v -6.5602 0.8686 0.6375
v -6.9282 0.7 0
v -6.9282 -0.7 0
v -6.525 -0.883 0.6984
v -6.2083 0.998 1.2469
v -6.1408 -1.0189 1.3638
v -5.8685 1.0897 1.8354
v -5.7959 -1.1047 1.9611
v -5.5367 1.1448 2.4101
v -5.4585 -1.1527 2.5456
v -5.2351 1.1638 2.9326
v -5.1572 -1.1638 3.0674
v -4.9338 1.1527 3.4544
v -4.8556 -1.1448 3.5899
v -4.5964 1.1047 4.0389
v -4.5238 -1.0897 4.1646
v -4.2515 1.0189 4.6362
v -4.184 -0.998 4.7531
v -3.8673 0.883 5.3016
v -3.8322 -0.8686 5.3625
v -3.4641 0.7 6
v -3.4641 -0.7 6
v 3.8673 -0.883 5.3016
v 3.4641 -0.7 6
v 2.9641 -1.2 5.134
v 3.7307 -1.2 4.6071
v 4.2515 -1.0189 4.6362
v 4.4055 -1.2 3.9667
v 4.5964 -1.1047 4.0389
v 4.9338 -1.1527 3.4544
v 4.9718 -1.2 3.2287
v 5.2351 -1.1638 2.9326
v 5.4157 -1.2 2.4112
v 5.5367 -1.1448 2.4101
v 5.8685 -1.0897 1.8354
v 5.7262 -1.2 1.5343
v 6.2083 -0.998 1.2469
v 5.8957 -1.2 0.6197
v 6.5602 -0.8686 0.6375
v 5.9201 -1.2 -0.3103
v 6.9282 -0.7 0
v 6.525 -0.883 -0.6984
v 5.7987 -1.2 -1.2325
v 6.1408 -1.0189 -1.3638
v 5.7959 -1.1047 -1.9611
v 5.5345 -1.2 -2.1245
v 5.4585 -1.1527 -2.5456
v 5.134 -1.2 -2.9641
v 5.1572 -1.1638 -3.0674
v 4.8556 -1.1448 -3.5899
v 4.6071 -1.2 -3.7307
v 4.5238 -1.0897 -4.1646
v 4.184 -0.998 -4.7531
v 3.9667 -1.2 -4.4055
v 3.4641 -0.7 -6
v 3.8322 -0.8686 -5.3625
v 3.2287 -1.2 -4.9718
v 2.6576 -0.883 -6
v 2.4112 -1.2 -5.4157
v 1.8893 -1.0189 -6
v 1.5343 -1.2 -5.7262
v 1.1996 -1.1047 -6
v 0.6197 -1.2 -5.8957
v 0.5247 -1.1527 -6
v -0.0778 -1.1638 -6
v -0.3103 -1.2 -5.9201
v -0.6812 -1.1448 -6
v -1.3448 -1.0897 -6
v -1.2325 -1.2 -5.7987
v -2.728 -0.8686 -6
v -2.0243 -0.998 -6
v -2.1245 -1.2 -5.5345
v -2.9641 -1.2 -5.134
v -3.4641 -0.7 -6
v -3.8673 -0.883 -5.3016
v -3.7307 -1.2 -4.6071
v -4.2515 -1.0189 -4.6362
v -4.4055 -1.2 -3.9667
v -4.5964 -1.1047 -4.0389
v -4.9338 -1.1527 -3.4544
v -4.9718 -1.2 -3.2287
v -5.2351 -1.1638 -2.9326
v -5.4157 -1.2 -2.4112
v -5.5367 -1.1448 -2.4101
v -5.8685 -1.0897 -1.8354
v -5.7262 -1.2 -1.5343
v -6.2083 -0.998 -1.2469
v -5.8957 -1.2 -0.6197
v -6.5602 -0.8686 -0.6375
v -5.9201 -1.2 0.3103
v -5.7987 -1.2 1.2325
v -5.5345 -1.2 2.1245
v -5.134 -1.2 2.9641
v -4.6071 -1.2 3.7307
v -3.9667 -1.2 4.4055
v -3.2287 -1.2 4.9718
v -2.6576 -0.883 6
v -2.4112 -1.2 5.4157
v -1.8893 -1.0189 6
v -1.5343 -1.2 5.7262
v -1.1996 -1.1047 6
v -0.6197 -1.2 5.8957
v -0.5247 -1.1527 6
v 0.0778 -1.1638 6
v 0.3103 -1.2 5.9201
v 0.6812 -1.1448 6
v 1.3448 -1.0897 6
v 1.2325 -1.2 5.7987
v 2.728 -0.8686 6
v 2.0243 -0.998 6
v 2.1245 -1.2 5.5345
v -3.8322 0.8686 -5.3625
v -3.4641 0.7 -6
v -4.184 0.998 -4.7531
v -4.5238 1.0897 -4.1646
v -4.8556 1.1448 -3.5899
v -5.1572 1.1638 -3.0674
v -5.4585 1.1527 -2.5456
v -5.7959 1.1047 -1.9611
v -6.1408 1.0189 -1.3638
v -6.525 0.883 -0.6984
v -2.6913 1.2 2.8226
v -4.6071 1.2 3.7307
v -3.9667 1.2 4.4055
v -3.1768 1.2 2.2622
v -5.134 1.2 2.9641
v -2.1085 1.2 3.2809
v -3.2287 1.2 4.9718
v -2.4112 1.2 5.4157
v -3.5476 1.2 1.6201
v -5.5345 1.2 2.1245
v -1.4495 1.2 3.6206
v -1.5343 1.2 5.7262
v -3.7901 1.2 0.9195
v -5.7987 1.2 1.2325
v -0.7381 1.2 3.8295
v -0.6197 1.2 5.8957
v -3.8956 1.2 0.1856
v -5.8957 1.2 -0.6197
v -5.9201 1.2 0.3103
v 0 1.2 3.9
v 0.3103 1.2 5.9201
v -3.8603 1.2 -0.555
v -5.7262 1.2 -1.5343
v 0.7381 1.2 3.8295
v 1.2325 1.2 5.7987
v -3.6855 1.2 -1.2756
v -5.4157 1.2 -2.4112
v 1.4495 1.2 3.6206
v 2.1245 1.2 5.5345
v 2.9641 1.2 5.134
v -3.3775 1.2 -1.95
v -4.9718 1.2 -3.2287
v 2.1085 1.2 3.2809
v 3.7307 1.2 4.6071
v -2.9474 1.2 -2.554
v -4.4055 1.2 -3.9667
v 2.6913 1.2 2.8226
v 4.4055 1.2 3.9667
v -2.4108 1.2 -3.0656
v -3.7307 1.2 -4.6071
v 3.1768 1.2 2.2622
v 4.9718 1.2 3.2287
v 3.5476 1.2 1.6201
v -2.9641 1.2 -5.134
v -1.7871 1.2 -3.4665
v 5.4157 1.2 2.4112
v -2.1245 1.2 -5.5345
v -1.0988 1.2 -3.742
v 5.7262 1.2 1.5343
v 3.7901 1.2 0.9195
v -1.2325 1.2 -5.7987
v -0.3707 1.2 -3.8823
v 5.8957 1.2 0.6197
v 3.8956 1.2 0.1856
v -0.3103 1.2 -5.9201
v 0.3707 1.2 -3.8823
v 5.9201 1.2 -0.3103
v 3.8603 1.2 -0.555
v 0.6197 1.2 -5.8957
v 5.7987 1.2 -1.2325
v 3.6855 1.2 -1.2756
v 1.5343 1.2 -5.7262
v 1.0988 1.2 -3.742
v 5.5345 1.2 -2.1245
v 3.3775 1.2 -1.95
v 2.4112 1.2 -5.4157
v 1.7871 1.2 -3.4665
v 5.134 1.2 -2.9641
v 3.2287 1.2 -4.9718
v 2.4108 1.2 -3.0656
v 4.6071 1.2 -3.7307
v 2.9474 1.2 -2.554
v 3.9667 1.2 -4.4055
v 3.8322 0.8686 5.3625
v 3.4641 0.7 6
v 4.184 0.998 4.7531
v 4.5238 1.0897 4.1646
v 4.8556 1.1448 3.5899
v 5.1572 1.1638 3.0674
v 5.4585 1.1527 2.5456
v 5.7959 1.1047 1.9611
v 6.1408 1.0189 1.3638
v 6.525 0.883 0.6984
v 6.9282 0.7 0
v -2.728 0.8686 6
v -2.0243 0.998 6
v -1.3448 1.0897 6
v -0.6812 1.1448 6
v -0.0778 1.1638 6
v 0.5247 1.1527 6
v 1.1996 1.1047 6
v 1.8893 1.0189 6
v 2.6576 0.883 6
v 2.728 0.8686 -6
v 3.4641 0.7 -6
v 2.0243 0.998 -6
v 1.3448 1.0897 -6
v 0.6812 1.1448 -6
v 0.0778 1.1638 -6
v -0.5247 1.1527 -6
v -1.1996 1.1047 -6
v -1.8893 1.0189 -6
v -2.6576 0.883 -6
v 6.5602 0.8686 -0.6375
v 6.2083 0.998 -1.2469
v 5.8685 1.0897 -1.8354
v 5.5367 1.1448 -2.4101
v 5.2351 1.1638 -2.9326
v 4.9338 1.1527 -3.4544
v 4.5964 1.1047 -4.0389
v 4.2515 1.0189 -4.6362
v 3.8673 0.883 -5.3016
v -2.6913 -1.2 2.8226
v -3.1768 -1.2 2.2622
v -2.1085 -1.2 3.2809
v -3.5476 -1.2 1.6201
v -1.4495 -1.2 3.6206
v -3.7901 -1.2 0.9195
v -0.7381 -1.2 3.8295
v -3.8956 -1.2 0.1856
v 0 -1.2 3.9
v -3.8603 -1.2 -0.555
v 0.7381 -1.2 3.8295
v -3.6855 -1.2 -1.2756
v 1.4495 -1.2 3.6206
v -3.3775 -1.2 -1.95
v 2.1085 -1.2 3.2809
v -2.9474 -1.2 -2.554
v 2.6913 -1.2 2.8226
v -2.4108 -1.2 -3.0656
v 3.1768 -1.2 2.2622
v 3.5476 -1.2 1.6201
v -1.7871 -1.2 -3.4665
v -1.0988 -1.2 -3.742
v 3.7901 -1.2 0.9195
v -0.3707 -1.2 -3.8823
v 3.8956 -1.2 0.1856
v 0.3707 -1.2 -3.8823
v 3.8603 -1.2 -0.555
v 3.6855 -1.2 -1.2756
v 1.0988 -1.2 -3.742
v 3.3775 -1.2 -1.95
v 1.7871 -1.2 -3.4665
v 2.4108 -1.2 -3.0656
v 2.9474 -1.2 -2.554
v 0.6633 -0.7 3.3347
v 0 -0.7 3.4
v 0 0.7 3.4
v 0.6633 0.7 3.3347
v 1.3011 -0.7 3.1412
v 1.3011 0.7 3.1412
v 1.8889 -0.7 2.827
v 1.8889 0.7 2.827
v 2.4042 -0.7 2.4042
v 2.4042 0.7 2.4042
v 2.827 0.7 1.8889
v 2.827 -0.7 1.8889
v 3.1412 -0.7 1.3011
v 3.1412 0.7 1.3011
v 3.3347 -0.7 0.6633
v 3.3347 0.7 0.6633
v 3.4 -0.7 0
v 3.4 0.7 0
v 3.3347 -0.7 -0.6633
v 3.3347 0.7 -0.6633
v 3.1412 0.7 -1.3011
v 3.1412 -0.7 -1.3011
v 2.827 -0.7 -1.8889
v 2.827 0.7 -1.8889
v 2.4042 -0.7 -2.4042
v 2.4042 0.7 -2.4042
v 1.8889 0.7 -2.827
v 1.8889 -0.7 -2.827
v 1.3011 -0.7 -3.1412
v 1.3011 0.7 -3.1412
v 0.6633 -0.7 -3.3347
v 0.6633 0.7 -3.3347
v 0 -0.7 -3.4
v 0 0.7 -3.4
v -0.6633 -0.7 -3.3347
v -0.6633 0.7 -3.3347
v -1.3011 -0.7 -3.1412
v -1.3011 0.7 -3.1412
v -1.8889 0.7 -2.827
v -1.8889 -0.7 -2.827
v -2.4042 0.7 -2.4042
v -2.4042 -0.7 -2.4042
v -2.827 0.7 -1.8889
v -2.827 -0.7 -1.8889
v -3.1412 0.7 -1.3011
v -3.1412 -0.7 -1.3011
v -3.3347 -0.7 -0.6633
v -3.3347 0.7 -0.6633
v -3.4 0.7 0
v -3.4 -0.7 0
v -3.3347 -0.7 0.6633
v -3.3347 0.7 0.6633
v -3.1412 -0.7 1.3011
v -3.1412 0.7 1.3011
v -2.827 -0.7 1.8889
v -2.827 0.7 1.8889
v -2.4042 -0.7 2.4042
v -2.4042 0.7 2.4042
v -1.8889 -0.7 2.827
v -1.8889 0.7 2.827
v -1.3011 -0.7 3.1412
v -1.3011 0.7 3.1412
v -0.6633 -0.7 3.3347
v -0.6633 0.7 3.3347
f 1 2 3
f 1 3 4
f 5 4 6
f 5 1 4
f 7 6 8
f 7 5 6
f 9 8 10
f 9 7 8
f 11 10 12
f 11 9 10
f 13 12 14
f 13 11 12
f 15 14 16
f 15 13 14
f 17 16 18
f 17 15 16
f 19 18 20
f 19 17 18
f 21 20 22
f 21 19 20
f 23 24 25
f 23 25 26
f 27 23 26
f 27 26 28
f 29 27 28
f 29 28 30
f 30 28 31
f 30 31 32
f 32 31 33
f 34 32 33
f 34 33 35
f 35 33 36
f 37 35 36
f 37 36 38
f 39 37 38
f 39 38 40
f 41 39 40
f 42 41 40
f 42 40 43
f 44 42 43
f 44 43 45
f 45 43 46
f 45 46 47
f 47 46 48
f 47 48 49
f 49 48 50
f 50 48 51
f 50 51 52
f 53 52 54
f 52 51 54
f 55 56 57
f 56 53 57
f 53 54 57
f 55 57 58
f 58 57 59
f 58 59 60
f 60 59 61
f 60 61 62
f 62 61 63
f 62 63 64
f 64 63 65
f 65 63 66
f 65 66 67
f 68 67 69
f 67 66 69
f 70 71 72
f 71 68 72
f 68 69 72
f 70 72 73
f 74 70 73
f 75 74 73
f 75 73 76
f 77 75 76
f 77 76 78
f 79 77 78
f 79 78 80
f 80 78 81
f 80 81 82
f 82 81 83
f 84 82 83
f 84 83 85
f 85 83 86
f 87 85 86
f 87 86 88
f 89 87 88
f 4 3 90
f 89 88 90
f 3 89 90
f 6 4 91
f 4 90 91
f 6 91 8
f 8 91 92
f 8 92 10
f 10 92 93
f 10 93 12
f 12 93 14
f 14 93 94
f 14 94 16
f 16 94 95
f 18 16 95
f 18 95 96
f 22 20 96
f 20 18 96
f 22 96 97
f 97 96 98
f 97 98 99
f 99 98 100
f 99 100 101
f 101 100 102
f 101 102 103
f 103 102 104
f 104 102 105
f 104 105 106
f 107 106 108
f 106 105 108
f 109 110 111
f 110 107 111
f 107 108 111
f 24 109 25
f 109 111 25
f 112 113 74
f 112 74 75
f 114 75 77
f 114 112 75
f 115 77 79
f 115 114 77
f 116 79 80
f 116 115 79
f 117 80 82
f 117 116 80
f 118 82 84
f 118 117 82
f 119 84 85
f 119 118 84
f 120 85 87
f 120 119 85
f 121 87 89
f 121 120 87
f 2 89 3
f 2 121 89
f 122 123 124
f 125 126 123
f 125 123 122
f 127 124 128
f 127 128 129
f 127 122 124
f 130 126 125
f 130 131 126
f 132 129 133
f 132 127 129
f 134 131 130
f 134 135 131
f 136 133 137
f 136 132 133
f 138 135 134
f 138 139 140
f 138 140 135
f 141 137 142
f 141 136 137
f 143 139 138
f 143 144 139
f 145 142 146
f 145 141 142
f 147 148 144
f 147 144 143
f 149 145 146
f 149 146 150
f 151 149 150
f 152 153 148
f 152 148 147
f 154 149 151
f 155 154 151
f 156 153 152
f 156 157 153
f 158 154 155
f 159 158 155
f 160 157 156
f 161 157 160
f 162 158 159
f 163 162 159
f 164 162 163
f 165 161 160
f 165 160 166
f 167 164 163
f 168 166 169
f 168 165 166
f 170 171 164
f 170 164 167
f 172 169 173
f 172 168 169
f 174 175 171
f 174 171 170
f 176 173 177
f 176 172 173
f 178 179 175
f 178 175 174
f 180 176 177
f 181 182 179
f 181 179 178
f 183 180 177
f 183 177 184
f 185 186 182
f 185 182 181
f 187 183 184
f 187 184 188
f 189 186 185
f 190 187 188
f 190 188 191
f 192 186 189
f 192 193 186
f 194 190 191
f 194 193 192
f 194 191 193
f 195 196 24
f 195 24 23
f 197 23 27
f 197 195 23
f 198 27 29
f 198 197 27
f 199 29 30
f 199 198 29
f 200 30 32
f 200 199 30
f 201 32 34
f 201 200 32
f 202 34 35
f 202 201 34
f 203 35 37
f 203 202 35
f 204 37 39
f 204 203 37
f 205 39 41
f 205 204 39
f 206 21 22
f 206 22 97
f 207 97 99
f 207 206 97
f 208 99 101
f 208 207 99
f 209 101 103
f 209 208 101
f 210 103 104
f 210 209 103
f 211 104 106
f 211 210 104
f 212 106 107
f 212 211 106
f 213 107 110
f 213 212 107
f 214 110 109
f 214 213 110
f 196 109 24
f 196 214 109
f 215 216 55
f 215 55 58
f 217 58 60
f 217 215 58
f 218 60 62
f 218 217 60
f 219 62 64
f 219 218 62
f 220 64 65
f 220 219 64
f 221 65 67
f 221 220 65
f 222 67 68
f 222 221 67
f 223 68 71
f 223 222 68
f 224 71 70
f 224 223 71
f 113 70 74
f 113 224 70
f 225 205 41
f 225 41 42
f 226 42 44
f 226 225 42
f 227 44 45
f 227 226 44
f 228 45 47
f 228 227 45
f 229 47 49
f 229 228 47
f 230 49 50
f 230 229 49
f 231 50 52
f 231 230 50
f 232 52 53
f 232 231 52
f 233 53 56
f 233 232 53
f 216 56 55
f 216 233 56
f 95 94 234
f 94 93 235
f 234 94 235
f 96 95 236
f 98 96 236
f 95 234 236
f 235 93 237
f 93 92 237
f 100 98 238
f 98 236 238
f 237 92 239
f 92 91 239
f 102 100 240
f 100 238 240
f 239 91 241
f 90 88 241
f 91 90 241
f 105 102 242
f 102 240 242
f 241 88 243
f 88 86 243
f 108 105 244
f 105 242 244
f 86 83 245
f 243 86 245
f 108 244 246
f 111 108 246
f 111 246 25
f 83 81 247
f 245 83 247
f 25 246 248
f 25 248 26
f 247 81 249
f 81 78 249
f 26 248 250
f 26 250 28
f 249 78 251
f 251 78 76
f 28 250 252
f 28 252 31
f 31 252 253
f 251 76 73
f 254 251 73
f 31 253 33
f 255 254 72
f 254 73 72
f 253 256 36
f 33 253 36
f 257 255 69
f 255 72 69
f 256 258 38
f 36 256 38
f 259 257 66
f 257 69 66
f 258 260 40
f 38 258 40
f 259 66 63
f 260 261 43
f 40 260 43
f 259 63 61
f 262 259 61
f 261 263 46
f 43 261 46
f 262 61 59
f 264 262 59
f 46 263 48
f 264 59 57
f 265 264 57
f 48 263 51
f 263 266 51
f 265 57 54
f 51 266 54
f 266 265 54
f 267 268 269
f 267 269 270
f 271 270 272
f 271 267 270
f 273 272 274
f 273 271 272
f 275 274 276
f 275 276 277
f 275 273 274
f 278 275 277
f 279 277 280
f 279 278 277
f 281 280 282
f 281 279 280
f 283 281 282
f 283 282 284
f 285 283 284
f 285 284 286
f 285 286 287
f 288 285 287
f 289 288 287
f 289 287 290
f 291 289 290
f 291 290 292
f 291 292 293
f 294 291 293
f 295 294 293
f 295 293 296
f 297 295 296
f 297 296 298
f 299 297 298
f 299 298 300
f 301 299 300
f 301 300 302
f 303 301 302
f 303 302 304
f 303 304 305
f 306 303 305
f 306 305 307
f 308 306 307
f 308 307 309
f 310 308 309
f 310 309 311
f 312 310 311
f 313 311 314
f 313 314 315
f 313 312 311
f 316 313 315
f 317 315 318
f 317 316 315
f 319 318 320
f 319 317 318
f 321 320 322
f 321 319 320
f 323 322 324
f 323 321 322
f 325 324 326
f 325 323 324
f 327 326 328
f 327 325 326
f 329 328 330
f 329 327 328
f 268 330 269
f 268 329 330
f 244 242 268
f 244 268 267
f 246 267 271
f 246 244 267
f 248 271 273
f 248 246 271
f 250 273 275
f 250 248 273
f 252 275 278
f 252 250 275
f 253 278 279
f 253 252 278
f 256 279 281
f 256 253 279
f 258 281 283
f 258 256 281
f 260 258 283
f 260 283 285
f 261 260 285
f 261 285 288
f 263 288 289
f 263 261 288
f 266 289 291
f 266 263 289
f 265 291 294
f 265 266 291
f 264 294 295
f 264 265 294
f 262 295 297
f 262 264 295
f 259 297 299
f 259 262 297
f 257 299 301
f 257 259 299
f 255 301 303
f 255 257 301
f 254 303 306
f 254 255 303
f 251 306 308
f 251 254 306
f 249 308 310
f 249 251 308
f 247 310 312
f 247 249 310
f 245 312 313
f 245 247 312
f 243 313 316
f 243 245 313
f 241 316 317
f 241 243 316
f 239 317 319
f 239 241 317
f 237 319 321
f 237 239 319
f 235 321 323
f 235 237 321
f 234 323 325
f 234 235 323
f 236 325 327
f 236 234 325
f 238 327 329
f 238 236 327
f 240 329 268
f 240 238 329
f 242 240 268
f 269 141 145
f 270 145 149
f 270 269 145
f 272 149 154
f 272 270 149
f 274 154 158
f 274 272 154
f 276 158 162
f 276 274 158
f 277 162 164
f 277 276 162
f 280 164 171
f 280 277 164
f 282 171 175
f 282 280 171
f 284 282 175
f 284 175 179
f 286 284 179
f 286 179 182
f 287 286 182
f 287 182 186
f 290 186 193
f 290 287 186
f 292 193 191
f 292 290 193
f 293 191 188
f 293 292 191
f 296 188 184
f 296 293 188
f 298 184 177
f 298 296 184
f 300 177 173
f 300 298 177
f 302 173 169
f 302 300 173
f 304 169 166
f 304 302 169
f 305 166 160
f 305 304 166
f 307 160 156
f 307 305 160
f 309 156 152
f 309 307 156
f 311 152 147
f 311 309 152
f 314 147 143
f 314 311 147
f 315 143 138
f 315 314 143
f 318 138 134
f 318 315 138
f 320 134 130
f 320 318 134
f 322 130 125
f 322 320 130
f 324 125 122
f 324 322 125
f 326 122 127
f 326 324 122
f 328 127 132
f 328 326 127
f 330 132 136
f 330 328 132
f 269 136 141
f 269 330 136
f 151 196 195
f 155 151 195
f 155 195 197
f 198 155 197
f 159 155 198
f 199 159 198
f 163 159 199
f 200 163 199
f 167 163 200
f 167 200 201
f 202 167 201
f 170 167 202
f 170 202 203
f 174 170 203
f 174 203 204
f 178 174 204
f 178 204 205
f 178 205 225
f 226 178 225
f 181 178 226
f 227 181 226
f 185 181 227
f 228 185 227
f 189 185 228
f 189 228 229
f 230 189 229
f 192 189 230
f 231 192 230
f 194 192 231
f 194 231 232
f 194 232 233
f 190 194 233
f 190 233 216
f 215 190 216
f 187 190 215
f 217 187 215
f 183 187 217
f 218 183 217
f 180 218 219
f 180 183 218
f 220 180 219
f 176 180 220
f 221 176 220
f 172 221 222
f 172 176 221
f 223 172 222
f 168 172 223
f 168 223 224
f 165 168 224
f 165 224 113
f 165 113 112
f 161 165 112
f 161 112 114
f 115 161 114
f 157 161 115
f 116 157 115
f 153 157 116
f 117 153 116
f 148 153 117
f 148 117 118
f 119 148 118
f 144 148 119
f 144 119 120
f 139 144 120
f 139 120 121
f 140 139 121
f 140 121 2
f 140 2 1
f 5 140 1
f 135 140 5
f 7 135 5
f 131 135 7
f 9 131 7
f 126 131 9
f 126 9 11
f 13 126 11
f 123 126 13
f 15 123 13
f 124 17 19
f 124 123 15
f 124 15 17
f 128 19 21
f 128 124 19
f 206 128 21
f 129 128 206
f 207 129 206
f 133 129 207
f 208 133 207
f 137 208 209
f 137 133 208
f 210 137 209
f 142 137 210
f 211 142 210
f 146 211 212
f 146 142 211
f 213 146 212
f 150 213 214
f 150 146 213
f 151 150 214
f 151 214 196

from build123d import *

# Parameters (mm, degrees)
SKETCH1_R           = 3.4
BOSS_EXTRUDE1_DEPTH = 1.2
CHAMFER1_SIZE       = 0.5


with BuildPart() as part:
    # Sketch1 → Boss-Extrude1 (new, symmetric)
    with BuildSketch(Plane(origin=(0, 0, 0), x_dir=(1, 0, 0), z_dir=(0, 1, 0))):
        Polygon((3.464101615, 6), (-3.464101615, 6), (-6.92820323, 0), (-3.464101615, -6), (3.464101615, -6), (6.92820323, 0), align=None)
        with Locations(Location((0, 0, 0), (0, 0, 270))):
            Circle(SKETCH1_R, mode=Mode.SUBTRACT)
    extrude(amount=BOSS_EXTRUDE1_DEPTH, both=True)

    # Chamfer1
    chamfer1_edges = [part.edges().sort_by_distance(p)[0] for p in [
        (0, -1.2, -3.4),
        (0, 1.2, -3.4),
    ]]
    chamfer(chamfer1_edges, length=CHAMFER1_SIZE)

    # Sketch3 → Cut-Revolve1 (revolve, cut)
    with BuildSketch(Plane.XY, mode=Mode.PRIVATE) as cut_revolve1_sk:
        Polygon((6.92820323, 1.2), (6.92820323, 0.7), (5.92820323, 1.2), align=None)
        Polygon((5.92820323, -1.2), (6.92820323, -1.2), (6.92820323, -0.7), align=None)
    revolve(cut_revolve1_sk.sketch.rotate(Axis((0, 0, 0), (0, 1, 0)), 300.000000007), axis=Axis((0, 0, 0), (0, 1, 0)), mode=Mode.SUBTRACT)


solid = part.part
